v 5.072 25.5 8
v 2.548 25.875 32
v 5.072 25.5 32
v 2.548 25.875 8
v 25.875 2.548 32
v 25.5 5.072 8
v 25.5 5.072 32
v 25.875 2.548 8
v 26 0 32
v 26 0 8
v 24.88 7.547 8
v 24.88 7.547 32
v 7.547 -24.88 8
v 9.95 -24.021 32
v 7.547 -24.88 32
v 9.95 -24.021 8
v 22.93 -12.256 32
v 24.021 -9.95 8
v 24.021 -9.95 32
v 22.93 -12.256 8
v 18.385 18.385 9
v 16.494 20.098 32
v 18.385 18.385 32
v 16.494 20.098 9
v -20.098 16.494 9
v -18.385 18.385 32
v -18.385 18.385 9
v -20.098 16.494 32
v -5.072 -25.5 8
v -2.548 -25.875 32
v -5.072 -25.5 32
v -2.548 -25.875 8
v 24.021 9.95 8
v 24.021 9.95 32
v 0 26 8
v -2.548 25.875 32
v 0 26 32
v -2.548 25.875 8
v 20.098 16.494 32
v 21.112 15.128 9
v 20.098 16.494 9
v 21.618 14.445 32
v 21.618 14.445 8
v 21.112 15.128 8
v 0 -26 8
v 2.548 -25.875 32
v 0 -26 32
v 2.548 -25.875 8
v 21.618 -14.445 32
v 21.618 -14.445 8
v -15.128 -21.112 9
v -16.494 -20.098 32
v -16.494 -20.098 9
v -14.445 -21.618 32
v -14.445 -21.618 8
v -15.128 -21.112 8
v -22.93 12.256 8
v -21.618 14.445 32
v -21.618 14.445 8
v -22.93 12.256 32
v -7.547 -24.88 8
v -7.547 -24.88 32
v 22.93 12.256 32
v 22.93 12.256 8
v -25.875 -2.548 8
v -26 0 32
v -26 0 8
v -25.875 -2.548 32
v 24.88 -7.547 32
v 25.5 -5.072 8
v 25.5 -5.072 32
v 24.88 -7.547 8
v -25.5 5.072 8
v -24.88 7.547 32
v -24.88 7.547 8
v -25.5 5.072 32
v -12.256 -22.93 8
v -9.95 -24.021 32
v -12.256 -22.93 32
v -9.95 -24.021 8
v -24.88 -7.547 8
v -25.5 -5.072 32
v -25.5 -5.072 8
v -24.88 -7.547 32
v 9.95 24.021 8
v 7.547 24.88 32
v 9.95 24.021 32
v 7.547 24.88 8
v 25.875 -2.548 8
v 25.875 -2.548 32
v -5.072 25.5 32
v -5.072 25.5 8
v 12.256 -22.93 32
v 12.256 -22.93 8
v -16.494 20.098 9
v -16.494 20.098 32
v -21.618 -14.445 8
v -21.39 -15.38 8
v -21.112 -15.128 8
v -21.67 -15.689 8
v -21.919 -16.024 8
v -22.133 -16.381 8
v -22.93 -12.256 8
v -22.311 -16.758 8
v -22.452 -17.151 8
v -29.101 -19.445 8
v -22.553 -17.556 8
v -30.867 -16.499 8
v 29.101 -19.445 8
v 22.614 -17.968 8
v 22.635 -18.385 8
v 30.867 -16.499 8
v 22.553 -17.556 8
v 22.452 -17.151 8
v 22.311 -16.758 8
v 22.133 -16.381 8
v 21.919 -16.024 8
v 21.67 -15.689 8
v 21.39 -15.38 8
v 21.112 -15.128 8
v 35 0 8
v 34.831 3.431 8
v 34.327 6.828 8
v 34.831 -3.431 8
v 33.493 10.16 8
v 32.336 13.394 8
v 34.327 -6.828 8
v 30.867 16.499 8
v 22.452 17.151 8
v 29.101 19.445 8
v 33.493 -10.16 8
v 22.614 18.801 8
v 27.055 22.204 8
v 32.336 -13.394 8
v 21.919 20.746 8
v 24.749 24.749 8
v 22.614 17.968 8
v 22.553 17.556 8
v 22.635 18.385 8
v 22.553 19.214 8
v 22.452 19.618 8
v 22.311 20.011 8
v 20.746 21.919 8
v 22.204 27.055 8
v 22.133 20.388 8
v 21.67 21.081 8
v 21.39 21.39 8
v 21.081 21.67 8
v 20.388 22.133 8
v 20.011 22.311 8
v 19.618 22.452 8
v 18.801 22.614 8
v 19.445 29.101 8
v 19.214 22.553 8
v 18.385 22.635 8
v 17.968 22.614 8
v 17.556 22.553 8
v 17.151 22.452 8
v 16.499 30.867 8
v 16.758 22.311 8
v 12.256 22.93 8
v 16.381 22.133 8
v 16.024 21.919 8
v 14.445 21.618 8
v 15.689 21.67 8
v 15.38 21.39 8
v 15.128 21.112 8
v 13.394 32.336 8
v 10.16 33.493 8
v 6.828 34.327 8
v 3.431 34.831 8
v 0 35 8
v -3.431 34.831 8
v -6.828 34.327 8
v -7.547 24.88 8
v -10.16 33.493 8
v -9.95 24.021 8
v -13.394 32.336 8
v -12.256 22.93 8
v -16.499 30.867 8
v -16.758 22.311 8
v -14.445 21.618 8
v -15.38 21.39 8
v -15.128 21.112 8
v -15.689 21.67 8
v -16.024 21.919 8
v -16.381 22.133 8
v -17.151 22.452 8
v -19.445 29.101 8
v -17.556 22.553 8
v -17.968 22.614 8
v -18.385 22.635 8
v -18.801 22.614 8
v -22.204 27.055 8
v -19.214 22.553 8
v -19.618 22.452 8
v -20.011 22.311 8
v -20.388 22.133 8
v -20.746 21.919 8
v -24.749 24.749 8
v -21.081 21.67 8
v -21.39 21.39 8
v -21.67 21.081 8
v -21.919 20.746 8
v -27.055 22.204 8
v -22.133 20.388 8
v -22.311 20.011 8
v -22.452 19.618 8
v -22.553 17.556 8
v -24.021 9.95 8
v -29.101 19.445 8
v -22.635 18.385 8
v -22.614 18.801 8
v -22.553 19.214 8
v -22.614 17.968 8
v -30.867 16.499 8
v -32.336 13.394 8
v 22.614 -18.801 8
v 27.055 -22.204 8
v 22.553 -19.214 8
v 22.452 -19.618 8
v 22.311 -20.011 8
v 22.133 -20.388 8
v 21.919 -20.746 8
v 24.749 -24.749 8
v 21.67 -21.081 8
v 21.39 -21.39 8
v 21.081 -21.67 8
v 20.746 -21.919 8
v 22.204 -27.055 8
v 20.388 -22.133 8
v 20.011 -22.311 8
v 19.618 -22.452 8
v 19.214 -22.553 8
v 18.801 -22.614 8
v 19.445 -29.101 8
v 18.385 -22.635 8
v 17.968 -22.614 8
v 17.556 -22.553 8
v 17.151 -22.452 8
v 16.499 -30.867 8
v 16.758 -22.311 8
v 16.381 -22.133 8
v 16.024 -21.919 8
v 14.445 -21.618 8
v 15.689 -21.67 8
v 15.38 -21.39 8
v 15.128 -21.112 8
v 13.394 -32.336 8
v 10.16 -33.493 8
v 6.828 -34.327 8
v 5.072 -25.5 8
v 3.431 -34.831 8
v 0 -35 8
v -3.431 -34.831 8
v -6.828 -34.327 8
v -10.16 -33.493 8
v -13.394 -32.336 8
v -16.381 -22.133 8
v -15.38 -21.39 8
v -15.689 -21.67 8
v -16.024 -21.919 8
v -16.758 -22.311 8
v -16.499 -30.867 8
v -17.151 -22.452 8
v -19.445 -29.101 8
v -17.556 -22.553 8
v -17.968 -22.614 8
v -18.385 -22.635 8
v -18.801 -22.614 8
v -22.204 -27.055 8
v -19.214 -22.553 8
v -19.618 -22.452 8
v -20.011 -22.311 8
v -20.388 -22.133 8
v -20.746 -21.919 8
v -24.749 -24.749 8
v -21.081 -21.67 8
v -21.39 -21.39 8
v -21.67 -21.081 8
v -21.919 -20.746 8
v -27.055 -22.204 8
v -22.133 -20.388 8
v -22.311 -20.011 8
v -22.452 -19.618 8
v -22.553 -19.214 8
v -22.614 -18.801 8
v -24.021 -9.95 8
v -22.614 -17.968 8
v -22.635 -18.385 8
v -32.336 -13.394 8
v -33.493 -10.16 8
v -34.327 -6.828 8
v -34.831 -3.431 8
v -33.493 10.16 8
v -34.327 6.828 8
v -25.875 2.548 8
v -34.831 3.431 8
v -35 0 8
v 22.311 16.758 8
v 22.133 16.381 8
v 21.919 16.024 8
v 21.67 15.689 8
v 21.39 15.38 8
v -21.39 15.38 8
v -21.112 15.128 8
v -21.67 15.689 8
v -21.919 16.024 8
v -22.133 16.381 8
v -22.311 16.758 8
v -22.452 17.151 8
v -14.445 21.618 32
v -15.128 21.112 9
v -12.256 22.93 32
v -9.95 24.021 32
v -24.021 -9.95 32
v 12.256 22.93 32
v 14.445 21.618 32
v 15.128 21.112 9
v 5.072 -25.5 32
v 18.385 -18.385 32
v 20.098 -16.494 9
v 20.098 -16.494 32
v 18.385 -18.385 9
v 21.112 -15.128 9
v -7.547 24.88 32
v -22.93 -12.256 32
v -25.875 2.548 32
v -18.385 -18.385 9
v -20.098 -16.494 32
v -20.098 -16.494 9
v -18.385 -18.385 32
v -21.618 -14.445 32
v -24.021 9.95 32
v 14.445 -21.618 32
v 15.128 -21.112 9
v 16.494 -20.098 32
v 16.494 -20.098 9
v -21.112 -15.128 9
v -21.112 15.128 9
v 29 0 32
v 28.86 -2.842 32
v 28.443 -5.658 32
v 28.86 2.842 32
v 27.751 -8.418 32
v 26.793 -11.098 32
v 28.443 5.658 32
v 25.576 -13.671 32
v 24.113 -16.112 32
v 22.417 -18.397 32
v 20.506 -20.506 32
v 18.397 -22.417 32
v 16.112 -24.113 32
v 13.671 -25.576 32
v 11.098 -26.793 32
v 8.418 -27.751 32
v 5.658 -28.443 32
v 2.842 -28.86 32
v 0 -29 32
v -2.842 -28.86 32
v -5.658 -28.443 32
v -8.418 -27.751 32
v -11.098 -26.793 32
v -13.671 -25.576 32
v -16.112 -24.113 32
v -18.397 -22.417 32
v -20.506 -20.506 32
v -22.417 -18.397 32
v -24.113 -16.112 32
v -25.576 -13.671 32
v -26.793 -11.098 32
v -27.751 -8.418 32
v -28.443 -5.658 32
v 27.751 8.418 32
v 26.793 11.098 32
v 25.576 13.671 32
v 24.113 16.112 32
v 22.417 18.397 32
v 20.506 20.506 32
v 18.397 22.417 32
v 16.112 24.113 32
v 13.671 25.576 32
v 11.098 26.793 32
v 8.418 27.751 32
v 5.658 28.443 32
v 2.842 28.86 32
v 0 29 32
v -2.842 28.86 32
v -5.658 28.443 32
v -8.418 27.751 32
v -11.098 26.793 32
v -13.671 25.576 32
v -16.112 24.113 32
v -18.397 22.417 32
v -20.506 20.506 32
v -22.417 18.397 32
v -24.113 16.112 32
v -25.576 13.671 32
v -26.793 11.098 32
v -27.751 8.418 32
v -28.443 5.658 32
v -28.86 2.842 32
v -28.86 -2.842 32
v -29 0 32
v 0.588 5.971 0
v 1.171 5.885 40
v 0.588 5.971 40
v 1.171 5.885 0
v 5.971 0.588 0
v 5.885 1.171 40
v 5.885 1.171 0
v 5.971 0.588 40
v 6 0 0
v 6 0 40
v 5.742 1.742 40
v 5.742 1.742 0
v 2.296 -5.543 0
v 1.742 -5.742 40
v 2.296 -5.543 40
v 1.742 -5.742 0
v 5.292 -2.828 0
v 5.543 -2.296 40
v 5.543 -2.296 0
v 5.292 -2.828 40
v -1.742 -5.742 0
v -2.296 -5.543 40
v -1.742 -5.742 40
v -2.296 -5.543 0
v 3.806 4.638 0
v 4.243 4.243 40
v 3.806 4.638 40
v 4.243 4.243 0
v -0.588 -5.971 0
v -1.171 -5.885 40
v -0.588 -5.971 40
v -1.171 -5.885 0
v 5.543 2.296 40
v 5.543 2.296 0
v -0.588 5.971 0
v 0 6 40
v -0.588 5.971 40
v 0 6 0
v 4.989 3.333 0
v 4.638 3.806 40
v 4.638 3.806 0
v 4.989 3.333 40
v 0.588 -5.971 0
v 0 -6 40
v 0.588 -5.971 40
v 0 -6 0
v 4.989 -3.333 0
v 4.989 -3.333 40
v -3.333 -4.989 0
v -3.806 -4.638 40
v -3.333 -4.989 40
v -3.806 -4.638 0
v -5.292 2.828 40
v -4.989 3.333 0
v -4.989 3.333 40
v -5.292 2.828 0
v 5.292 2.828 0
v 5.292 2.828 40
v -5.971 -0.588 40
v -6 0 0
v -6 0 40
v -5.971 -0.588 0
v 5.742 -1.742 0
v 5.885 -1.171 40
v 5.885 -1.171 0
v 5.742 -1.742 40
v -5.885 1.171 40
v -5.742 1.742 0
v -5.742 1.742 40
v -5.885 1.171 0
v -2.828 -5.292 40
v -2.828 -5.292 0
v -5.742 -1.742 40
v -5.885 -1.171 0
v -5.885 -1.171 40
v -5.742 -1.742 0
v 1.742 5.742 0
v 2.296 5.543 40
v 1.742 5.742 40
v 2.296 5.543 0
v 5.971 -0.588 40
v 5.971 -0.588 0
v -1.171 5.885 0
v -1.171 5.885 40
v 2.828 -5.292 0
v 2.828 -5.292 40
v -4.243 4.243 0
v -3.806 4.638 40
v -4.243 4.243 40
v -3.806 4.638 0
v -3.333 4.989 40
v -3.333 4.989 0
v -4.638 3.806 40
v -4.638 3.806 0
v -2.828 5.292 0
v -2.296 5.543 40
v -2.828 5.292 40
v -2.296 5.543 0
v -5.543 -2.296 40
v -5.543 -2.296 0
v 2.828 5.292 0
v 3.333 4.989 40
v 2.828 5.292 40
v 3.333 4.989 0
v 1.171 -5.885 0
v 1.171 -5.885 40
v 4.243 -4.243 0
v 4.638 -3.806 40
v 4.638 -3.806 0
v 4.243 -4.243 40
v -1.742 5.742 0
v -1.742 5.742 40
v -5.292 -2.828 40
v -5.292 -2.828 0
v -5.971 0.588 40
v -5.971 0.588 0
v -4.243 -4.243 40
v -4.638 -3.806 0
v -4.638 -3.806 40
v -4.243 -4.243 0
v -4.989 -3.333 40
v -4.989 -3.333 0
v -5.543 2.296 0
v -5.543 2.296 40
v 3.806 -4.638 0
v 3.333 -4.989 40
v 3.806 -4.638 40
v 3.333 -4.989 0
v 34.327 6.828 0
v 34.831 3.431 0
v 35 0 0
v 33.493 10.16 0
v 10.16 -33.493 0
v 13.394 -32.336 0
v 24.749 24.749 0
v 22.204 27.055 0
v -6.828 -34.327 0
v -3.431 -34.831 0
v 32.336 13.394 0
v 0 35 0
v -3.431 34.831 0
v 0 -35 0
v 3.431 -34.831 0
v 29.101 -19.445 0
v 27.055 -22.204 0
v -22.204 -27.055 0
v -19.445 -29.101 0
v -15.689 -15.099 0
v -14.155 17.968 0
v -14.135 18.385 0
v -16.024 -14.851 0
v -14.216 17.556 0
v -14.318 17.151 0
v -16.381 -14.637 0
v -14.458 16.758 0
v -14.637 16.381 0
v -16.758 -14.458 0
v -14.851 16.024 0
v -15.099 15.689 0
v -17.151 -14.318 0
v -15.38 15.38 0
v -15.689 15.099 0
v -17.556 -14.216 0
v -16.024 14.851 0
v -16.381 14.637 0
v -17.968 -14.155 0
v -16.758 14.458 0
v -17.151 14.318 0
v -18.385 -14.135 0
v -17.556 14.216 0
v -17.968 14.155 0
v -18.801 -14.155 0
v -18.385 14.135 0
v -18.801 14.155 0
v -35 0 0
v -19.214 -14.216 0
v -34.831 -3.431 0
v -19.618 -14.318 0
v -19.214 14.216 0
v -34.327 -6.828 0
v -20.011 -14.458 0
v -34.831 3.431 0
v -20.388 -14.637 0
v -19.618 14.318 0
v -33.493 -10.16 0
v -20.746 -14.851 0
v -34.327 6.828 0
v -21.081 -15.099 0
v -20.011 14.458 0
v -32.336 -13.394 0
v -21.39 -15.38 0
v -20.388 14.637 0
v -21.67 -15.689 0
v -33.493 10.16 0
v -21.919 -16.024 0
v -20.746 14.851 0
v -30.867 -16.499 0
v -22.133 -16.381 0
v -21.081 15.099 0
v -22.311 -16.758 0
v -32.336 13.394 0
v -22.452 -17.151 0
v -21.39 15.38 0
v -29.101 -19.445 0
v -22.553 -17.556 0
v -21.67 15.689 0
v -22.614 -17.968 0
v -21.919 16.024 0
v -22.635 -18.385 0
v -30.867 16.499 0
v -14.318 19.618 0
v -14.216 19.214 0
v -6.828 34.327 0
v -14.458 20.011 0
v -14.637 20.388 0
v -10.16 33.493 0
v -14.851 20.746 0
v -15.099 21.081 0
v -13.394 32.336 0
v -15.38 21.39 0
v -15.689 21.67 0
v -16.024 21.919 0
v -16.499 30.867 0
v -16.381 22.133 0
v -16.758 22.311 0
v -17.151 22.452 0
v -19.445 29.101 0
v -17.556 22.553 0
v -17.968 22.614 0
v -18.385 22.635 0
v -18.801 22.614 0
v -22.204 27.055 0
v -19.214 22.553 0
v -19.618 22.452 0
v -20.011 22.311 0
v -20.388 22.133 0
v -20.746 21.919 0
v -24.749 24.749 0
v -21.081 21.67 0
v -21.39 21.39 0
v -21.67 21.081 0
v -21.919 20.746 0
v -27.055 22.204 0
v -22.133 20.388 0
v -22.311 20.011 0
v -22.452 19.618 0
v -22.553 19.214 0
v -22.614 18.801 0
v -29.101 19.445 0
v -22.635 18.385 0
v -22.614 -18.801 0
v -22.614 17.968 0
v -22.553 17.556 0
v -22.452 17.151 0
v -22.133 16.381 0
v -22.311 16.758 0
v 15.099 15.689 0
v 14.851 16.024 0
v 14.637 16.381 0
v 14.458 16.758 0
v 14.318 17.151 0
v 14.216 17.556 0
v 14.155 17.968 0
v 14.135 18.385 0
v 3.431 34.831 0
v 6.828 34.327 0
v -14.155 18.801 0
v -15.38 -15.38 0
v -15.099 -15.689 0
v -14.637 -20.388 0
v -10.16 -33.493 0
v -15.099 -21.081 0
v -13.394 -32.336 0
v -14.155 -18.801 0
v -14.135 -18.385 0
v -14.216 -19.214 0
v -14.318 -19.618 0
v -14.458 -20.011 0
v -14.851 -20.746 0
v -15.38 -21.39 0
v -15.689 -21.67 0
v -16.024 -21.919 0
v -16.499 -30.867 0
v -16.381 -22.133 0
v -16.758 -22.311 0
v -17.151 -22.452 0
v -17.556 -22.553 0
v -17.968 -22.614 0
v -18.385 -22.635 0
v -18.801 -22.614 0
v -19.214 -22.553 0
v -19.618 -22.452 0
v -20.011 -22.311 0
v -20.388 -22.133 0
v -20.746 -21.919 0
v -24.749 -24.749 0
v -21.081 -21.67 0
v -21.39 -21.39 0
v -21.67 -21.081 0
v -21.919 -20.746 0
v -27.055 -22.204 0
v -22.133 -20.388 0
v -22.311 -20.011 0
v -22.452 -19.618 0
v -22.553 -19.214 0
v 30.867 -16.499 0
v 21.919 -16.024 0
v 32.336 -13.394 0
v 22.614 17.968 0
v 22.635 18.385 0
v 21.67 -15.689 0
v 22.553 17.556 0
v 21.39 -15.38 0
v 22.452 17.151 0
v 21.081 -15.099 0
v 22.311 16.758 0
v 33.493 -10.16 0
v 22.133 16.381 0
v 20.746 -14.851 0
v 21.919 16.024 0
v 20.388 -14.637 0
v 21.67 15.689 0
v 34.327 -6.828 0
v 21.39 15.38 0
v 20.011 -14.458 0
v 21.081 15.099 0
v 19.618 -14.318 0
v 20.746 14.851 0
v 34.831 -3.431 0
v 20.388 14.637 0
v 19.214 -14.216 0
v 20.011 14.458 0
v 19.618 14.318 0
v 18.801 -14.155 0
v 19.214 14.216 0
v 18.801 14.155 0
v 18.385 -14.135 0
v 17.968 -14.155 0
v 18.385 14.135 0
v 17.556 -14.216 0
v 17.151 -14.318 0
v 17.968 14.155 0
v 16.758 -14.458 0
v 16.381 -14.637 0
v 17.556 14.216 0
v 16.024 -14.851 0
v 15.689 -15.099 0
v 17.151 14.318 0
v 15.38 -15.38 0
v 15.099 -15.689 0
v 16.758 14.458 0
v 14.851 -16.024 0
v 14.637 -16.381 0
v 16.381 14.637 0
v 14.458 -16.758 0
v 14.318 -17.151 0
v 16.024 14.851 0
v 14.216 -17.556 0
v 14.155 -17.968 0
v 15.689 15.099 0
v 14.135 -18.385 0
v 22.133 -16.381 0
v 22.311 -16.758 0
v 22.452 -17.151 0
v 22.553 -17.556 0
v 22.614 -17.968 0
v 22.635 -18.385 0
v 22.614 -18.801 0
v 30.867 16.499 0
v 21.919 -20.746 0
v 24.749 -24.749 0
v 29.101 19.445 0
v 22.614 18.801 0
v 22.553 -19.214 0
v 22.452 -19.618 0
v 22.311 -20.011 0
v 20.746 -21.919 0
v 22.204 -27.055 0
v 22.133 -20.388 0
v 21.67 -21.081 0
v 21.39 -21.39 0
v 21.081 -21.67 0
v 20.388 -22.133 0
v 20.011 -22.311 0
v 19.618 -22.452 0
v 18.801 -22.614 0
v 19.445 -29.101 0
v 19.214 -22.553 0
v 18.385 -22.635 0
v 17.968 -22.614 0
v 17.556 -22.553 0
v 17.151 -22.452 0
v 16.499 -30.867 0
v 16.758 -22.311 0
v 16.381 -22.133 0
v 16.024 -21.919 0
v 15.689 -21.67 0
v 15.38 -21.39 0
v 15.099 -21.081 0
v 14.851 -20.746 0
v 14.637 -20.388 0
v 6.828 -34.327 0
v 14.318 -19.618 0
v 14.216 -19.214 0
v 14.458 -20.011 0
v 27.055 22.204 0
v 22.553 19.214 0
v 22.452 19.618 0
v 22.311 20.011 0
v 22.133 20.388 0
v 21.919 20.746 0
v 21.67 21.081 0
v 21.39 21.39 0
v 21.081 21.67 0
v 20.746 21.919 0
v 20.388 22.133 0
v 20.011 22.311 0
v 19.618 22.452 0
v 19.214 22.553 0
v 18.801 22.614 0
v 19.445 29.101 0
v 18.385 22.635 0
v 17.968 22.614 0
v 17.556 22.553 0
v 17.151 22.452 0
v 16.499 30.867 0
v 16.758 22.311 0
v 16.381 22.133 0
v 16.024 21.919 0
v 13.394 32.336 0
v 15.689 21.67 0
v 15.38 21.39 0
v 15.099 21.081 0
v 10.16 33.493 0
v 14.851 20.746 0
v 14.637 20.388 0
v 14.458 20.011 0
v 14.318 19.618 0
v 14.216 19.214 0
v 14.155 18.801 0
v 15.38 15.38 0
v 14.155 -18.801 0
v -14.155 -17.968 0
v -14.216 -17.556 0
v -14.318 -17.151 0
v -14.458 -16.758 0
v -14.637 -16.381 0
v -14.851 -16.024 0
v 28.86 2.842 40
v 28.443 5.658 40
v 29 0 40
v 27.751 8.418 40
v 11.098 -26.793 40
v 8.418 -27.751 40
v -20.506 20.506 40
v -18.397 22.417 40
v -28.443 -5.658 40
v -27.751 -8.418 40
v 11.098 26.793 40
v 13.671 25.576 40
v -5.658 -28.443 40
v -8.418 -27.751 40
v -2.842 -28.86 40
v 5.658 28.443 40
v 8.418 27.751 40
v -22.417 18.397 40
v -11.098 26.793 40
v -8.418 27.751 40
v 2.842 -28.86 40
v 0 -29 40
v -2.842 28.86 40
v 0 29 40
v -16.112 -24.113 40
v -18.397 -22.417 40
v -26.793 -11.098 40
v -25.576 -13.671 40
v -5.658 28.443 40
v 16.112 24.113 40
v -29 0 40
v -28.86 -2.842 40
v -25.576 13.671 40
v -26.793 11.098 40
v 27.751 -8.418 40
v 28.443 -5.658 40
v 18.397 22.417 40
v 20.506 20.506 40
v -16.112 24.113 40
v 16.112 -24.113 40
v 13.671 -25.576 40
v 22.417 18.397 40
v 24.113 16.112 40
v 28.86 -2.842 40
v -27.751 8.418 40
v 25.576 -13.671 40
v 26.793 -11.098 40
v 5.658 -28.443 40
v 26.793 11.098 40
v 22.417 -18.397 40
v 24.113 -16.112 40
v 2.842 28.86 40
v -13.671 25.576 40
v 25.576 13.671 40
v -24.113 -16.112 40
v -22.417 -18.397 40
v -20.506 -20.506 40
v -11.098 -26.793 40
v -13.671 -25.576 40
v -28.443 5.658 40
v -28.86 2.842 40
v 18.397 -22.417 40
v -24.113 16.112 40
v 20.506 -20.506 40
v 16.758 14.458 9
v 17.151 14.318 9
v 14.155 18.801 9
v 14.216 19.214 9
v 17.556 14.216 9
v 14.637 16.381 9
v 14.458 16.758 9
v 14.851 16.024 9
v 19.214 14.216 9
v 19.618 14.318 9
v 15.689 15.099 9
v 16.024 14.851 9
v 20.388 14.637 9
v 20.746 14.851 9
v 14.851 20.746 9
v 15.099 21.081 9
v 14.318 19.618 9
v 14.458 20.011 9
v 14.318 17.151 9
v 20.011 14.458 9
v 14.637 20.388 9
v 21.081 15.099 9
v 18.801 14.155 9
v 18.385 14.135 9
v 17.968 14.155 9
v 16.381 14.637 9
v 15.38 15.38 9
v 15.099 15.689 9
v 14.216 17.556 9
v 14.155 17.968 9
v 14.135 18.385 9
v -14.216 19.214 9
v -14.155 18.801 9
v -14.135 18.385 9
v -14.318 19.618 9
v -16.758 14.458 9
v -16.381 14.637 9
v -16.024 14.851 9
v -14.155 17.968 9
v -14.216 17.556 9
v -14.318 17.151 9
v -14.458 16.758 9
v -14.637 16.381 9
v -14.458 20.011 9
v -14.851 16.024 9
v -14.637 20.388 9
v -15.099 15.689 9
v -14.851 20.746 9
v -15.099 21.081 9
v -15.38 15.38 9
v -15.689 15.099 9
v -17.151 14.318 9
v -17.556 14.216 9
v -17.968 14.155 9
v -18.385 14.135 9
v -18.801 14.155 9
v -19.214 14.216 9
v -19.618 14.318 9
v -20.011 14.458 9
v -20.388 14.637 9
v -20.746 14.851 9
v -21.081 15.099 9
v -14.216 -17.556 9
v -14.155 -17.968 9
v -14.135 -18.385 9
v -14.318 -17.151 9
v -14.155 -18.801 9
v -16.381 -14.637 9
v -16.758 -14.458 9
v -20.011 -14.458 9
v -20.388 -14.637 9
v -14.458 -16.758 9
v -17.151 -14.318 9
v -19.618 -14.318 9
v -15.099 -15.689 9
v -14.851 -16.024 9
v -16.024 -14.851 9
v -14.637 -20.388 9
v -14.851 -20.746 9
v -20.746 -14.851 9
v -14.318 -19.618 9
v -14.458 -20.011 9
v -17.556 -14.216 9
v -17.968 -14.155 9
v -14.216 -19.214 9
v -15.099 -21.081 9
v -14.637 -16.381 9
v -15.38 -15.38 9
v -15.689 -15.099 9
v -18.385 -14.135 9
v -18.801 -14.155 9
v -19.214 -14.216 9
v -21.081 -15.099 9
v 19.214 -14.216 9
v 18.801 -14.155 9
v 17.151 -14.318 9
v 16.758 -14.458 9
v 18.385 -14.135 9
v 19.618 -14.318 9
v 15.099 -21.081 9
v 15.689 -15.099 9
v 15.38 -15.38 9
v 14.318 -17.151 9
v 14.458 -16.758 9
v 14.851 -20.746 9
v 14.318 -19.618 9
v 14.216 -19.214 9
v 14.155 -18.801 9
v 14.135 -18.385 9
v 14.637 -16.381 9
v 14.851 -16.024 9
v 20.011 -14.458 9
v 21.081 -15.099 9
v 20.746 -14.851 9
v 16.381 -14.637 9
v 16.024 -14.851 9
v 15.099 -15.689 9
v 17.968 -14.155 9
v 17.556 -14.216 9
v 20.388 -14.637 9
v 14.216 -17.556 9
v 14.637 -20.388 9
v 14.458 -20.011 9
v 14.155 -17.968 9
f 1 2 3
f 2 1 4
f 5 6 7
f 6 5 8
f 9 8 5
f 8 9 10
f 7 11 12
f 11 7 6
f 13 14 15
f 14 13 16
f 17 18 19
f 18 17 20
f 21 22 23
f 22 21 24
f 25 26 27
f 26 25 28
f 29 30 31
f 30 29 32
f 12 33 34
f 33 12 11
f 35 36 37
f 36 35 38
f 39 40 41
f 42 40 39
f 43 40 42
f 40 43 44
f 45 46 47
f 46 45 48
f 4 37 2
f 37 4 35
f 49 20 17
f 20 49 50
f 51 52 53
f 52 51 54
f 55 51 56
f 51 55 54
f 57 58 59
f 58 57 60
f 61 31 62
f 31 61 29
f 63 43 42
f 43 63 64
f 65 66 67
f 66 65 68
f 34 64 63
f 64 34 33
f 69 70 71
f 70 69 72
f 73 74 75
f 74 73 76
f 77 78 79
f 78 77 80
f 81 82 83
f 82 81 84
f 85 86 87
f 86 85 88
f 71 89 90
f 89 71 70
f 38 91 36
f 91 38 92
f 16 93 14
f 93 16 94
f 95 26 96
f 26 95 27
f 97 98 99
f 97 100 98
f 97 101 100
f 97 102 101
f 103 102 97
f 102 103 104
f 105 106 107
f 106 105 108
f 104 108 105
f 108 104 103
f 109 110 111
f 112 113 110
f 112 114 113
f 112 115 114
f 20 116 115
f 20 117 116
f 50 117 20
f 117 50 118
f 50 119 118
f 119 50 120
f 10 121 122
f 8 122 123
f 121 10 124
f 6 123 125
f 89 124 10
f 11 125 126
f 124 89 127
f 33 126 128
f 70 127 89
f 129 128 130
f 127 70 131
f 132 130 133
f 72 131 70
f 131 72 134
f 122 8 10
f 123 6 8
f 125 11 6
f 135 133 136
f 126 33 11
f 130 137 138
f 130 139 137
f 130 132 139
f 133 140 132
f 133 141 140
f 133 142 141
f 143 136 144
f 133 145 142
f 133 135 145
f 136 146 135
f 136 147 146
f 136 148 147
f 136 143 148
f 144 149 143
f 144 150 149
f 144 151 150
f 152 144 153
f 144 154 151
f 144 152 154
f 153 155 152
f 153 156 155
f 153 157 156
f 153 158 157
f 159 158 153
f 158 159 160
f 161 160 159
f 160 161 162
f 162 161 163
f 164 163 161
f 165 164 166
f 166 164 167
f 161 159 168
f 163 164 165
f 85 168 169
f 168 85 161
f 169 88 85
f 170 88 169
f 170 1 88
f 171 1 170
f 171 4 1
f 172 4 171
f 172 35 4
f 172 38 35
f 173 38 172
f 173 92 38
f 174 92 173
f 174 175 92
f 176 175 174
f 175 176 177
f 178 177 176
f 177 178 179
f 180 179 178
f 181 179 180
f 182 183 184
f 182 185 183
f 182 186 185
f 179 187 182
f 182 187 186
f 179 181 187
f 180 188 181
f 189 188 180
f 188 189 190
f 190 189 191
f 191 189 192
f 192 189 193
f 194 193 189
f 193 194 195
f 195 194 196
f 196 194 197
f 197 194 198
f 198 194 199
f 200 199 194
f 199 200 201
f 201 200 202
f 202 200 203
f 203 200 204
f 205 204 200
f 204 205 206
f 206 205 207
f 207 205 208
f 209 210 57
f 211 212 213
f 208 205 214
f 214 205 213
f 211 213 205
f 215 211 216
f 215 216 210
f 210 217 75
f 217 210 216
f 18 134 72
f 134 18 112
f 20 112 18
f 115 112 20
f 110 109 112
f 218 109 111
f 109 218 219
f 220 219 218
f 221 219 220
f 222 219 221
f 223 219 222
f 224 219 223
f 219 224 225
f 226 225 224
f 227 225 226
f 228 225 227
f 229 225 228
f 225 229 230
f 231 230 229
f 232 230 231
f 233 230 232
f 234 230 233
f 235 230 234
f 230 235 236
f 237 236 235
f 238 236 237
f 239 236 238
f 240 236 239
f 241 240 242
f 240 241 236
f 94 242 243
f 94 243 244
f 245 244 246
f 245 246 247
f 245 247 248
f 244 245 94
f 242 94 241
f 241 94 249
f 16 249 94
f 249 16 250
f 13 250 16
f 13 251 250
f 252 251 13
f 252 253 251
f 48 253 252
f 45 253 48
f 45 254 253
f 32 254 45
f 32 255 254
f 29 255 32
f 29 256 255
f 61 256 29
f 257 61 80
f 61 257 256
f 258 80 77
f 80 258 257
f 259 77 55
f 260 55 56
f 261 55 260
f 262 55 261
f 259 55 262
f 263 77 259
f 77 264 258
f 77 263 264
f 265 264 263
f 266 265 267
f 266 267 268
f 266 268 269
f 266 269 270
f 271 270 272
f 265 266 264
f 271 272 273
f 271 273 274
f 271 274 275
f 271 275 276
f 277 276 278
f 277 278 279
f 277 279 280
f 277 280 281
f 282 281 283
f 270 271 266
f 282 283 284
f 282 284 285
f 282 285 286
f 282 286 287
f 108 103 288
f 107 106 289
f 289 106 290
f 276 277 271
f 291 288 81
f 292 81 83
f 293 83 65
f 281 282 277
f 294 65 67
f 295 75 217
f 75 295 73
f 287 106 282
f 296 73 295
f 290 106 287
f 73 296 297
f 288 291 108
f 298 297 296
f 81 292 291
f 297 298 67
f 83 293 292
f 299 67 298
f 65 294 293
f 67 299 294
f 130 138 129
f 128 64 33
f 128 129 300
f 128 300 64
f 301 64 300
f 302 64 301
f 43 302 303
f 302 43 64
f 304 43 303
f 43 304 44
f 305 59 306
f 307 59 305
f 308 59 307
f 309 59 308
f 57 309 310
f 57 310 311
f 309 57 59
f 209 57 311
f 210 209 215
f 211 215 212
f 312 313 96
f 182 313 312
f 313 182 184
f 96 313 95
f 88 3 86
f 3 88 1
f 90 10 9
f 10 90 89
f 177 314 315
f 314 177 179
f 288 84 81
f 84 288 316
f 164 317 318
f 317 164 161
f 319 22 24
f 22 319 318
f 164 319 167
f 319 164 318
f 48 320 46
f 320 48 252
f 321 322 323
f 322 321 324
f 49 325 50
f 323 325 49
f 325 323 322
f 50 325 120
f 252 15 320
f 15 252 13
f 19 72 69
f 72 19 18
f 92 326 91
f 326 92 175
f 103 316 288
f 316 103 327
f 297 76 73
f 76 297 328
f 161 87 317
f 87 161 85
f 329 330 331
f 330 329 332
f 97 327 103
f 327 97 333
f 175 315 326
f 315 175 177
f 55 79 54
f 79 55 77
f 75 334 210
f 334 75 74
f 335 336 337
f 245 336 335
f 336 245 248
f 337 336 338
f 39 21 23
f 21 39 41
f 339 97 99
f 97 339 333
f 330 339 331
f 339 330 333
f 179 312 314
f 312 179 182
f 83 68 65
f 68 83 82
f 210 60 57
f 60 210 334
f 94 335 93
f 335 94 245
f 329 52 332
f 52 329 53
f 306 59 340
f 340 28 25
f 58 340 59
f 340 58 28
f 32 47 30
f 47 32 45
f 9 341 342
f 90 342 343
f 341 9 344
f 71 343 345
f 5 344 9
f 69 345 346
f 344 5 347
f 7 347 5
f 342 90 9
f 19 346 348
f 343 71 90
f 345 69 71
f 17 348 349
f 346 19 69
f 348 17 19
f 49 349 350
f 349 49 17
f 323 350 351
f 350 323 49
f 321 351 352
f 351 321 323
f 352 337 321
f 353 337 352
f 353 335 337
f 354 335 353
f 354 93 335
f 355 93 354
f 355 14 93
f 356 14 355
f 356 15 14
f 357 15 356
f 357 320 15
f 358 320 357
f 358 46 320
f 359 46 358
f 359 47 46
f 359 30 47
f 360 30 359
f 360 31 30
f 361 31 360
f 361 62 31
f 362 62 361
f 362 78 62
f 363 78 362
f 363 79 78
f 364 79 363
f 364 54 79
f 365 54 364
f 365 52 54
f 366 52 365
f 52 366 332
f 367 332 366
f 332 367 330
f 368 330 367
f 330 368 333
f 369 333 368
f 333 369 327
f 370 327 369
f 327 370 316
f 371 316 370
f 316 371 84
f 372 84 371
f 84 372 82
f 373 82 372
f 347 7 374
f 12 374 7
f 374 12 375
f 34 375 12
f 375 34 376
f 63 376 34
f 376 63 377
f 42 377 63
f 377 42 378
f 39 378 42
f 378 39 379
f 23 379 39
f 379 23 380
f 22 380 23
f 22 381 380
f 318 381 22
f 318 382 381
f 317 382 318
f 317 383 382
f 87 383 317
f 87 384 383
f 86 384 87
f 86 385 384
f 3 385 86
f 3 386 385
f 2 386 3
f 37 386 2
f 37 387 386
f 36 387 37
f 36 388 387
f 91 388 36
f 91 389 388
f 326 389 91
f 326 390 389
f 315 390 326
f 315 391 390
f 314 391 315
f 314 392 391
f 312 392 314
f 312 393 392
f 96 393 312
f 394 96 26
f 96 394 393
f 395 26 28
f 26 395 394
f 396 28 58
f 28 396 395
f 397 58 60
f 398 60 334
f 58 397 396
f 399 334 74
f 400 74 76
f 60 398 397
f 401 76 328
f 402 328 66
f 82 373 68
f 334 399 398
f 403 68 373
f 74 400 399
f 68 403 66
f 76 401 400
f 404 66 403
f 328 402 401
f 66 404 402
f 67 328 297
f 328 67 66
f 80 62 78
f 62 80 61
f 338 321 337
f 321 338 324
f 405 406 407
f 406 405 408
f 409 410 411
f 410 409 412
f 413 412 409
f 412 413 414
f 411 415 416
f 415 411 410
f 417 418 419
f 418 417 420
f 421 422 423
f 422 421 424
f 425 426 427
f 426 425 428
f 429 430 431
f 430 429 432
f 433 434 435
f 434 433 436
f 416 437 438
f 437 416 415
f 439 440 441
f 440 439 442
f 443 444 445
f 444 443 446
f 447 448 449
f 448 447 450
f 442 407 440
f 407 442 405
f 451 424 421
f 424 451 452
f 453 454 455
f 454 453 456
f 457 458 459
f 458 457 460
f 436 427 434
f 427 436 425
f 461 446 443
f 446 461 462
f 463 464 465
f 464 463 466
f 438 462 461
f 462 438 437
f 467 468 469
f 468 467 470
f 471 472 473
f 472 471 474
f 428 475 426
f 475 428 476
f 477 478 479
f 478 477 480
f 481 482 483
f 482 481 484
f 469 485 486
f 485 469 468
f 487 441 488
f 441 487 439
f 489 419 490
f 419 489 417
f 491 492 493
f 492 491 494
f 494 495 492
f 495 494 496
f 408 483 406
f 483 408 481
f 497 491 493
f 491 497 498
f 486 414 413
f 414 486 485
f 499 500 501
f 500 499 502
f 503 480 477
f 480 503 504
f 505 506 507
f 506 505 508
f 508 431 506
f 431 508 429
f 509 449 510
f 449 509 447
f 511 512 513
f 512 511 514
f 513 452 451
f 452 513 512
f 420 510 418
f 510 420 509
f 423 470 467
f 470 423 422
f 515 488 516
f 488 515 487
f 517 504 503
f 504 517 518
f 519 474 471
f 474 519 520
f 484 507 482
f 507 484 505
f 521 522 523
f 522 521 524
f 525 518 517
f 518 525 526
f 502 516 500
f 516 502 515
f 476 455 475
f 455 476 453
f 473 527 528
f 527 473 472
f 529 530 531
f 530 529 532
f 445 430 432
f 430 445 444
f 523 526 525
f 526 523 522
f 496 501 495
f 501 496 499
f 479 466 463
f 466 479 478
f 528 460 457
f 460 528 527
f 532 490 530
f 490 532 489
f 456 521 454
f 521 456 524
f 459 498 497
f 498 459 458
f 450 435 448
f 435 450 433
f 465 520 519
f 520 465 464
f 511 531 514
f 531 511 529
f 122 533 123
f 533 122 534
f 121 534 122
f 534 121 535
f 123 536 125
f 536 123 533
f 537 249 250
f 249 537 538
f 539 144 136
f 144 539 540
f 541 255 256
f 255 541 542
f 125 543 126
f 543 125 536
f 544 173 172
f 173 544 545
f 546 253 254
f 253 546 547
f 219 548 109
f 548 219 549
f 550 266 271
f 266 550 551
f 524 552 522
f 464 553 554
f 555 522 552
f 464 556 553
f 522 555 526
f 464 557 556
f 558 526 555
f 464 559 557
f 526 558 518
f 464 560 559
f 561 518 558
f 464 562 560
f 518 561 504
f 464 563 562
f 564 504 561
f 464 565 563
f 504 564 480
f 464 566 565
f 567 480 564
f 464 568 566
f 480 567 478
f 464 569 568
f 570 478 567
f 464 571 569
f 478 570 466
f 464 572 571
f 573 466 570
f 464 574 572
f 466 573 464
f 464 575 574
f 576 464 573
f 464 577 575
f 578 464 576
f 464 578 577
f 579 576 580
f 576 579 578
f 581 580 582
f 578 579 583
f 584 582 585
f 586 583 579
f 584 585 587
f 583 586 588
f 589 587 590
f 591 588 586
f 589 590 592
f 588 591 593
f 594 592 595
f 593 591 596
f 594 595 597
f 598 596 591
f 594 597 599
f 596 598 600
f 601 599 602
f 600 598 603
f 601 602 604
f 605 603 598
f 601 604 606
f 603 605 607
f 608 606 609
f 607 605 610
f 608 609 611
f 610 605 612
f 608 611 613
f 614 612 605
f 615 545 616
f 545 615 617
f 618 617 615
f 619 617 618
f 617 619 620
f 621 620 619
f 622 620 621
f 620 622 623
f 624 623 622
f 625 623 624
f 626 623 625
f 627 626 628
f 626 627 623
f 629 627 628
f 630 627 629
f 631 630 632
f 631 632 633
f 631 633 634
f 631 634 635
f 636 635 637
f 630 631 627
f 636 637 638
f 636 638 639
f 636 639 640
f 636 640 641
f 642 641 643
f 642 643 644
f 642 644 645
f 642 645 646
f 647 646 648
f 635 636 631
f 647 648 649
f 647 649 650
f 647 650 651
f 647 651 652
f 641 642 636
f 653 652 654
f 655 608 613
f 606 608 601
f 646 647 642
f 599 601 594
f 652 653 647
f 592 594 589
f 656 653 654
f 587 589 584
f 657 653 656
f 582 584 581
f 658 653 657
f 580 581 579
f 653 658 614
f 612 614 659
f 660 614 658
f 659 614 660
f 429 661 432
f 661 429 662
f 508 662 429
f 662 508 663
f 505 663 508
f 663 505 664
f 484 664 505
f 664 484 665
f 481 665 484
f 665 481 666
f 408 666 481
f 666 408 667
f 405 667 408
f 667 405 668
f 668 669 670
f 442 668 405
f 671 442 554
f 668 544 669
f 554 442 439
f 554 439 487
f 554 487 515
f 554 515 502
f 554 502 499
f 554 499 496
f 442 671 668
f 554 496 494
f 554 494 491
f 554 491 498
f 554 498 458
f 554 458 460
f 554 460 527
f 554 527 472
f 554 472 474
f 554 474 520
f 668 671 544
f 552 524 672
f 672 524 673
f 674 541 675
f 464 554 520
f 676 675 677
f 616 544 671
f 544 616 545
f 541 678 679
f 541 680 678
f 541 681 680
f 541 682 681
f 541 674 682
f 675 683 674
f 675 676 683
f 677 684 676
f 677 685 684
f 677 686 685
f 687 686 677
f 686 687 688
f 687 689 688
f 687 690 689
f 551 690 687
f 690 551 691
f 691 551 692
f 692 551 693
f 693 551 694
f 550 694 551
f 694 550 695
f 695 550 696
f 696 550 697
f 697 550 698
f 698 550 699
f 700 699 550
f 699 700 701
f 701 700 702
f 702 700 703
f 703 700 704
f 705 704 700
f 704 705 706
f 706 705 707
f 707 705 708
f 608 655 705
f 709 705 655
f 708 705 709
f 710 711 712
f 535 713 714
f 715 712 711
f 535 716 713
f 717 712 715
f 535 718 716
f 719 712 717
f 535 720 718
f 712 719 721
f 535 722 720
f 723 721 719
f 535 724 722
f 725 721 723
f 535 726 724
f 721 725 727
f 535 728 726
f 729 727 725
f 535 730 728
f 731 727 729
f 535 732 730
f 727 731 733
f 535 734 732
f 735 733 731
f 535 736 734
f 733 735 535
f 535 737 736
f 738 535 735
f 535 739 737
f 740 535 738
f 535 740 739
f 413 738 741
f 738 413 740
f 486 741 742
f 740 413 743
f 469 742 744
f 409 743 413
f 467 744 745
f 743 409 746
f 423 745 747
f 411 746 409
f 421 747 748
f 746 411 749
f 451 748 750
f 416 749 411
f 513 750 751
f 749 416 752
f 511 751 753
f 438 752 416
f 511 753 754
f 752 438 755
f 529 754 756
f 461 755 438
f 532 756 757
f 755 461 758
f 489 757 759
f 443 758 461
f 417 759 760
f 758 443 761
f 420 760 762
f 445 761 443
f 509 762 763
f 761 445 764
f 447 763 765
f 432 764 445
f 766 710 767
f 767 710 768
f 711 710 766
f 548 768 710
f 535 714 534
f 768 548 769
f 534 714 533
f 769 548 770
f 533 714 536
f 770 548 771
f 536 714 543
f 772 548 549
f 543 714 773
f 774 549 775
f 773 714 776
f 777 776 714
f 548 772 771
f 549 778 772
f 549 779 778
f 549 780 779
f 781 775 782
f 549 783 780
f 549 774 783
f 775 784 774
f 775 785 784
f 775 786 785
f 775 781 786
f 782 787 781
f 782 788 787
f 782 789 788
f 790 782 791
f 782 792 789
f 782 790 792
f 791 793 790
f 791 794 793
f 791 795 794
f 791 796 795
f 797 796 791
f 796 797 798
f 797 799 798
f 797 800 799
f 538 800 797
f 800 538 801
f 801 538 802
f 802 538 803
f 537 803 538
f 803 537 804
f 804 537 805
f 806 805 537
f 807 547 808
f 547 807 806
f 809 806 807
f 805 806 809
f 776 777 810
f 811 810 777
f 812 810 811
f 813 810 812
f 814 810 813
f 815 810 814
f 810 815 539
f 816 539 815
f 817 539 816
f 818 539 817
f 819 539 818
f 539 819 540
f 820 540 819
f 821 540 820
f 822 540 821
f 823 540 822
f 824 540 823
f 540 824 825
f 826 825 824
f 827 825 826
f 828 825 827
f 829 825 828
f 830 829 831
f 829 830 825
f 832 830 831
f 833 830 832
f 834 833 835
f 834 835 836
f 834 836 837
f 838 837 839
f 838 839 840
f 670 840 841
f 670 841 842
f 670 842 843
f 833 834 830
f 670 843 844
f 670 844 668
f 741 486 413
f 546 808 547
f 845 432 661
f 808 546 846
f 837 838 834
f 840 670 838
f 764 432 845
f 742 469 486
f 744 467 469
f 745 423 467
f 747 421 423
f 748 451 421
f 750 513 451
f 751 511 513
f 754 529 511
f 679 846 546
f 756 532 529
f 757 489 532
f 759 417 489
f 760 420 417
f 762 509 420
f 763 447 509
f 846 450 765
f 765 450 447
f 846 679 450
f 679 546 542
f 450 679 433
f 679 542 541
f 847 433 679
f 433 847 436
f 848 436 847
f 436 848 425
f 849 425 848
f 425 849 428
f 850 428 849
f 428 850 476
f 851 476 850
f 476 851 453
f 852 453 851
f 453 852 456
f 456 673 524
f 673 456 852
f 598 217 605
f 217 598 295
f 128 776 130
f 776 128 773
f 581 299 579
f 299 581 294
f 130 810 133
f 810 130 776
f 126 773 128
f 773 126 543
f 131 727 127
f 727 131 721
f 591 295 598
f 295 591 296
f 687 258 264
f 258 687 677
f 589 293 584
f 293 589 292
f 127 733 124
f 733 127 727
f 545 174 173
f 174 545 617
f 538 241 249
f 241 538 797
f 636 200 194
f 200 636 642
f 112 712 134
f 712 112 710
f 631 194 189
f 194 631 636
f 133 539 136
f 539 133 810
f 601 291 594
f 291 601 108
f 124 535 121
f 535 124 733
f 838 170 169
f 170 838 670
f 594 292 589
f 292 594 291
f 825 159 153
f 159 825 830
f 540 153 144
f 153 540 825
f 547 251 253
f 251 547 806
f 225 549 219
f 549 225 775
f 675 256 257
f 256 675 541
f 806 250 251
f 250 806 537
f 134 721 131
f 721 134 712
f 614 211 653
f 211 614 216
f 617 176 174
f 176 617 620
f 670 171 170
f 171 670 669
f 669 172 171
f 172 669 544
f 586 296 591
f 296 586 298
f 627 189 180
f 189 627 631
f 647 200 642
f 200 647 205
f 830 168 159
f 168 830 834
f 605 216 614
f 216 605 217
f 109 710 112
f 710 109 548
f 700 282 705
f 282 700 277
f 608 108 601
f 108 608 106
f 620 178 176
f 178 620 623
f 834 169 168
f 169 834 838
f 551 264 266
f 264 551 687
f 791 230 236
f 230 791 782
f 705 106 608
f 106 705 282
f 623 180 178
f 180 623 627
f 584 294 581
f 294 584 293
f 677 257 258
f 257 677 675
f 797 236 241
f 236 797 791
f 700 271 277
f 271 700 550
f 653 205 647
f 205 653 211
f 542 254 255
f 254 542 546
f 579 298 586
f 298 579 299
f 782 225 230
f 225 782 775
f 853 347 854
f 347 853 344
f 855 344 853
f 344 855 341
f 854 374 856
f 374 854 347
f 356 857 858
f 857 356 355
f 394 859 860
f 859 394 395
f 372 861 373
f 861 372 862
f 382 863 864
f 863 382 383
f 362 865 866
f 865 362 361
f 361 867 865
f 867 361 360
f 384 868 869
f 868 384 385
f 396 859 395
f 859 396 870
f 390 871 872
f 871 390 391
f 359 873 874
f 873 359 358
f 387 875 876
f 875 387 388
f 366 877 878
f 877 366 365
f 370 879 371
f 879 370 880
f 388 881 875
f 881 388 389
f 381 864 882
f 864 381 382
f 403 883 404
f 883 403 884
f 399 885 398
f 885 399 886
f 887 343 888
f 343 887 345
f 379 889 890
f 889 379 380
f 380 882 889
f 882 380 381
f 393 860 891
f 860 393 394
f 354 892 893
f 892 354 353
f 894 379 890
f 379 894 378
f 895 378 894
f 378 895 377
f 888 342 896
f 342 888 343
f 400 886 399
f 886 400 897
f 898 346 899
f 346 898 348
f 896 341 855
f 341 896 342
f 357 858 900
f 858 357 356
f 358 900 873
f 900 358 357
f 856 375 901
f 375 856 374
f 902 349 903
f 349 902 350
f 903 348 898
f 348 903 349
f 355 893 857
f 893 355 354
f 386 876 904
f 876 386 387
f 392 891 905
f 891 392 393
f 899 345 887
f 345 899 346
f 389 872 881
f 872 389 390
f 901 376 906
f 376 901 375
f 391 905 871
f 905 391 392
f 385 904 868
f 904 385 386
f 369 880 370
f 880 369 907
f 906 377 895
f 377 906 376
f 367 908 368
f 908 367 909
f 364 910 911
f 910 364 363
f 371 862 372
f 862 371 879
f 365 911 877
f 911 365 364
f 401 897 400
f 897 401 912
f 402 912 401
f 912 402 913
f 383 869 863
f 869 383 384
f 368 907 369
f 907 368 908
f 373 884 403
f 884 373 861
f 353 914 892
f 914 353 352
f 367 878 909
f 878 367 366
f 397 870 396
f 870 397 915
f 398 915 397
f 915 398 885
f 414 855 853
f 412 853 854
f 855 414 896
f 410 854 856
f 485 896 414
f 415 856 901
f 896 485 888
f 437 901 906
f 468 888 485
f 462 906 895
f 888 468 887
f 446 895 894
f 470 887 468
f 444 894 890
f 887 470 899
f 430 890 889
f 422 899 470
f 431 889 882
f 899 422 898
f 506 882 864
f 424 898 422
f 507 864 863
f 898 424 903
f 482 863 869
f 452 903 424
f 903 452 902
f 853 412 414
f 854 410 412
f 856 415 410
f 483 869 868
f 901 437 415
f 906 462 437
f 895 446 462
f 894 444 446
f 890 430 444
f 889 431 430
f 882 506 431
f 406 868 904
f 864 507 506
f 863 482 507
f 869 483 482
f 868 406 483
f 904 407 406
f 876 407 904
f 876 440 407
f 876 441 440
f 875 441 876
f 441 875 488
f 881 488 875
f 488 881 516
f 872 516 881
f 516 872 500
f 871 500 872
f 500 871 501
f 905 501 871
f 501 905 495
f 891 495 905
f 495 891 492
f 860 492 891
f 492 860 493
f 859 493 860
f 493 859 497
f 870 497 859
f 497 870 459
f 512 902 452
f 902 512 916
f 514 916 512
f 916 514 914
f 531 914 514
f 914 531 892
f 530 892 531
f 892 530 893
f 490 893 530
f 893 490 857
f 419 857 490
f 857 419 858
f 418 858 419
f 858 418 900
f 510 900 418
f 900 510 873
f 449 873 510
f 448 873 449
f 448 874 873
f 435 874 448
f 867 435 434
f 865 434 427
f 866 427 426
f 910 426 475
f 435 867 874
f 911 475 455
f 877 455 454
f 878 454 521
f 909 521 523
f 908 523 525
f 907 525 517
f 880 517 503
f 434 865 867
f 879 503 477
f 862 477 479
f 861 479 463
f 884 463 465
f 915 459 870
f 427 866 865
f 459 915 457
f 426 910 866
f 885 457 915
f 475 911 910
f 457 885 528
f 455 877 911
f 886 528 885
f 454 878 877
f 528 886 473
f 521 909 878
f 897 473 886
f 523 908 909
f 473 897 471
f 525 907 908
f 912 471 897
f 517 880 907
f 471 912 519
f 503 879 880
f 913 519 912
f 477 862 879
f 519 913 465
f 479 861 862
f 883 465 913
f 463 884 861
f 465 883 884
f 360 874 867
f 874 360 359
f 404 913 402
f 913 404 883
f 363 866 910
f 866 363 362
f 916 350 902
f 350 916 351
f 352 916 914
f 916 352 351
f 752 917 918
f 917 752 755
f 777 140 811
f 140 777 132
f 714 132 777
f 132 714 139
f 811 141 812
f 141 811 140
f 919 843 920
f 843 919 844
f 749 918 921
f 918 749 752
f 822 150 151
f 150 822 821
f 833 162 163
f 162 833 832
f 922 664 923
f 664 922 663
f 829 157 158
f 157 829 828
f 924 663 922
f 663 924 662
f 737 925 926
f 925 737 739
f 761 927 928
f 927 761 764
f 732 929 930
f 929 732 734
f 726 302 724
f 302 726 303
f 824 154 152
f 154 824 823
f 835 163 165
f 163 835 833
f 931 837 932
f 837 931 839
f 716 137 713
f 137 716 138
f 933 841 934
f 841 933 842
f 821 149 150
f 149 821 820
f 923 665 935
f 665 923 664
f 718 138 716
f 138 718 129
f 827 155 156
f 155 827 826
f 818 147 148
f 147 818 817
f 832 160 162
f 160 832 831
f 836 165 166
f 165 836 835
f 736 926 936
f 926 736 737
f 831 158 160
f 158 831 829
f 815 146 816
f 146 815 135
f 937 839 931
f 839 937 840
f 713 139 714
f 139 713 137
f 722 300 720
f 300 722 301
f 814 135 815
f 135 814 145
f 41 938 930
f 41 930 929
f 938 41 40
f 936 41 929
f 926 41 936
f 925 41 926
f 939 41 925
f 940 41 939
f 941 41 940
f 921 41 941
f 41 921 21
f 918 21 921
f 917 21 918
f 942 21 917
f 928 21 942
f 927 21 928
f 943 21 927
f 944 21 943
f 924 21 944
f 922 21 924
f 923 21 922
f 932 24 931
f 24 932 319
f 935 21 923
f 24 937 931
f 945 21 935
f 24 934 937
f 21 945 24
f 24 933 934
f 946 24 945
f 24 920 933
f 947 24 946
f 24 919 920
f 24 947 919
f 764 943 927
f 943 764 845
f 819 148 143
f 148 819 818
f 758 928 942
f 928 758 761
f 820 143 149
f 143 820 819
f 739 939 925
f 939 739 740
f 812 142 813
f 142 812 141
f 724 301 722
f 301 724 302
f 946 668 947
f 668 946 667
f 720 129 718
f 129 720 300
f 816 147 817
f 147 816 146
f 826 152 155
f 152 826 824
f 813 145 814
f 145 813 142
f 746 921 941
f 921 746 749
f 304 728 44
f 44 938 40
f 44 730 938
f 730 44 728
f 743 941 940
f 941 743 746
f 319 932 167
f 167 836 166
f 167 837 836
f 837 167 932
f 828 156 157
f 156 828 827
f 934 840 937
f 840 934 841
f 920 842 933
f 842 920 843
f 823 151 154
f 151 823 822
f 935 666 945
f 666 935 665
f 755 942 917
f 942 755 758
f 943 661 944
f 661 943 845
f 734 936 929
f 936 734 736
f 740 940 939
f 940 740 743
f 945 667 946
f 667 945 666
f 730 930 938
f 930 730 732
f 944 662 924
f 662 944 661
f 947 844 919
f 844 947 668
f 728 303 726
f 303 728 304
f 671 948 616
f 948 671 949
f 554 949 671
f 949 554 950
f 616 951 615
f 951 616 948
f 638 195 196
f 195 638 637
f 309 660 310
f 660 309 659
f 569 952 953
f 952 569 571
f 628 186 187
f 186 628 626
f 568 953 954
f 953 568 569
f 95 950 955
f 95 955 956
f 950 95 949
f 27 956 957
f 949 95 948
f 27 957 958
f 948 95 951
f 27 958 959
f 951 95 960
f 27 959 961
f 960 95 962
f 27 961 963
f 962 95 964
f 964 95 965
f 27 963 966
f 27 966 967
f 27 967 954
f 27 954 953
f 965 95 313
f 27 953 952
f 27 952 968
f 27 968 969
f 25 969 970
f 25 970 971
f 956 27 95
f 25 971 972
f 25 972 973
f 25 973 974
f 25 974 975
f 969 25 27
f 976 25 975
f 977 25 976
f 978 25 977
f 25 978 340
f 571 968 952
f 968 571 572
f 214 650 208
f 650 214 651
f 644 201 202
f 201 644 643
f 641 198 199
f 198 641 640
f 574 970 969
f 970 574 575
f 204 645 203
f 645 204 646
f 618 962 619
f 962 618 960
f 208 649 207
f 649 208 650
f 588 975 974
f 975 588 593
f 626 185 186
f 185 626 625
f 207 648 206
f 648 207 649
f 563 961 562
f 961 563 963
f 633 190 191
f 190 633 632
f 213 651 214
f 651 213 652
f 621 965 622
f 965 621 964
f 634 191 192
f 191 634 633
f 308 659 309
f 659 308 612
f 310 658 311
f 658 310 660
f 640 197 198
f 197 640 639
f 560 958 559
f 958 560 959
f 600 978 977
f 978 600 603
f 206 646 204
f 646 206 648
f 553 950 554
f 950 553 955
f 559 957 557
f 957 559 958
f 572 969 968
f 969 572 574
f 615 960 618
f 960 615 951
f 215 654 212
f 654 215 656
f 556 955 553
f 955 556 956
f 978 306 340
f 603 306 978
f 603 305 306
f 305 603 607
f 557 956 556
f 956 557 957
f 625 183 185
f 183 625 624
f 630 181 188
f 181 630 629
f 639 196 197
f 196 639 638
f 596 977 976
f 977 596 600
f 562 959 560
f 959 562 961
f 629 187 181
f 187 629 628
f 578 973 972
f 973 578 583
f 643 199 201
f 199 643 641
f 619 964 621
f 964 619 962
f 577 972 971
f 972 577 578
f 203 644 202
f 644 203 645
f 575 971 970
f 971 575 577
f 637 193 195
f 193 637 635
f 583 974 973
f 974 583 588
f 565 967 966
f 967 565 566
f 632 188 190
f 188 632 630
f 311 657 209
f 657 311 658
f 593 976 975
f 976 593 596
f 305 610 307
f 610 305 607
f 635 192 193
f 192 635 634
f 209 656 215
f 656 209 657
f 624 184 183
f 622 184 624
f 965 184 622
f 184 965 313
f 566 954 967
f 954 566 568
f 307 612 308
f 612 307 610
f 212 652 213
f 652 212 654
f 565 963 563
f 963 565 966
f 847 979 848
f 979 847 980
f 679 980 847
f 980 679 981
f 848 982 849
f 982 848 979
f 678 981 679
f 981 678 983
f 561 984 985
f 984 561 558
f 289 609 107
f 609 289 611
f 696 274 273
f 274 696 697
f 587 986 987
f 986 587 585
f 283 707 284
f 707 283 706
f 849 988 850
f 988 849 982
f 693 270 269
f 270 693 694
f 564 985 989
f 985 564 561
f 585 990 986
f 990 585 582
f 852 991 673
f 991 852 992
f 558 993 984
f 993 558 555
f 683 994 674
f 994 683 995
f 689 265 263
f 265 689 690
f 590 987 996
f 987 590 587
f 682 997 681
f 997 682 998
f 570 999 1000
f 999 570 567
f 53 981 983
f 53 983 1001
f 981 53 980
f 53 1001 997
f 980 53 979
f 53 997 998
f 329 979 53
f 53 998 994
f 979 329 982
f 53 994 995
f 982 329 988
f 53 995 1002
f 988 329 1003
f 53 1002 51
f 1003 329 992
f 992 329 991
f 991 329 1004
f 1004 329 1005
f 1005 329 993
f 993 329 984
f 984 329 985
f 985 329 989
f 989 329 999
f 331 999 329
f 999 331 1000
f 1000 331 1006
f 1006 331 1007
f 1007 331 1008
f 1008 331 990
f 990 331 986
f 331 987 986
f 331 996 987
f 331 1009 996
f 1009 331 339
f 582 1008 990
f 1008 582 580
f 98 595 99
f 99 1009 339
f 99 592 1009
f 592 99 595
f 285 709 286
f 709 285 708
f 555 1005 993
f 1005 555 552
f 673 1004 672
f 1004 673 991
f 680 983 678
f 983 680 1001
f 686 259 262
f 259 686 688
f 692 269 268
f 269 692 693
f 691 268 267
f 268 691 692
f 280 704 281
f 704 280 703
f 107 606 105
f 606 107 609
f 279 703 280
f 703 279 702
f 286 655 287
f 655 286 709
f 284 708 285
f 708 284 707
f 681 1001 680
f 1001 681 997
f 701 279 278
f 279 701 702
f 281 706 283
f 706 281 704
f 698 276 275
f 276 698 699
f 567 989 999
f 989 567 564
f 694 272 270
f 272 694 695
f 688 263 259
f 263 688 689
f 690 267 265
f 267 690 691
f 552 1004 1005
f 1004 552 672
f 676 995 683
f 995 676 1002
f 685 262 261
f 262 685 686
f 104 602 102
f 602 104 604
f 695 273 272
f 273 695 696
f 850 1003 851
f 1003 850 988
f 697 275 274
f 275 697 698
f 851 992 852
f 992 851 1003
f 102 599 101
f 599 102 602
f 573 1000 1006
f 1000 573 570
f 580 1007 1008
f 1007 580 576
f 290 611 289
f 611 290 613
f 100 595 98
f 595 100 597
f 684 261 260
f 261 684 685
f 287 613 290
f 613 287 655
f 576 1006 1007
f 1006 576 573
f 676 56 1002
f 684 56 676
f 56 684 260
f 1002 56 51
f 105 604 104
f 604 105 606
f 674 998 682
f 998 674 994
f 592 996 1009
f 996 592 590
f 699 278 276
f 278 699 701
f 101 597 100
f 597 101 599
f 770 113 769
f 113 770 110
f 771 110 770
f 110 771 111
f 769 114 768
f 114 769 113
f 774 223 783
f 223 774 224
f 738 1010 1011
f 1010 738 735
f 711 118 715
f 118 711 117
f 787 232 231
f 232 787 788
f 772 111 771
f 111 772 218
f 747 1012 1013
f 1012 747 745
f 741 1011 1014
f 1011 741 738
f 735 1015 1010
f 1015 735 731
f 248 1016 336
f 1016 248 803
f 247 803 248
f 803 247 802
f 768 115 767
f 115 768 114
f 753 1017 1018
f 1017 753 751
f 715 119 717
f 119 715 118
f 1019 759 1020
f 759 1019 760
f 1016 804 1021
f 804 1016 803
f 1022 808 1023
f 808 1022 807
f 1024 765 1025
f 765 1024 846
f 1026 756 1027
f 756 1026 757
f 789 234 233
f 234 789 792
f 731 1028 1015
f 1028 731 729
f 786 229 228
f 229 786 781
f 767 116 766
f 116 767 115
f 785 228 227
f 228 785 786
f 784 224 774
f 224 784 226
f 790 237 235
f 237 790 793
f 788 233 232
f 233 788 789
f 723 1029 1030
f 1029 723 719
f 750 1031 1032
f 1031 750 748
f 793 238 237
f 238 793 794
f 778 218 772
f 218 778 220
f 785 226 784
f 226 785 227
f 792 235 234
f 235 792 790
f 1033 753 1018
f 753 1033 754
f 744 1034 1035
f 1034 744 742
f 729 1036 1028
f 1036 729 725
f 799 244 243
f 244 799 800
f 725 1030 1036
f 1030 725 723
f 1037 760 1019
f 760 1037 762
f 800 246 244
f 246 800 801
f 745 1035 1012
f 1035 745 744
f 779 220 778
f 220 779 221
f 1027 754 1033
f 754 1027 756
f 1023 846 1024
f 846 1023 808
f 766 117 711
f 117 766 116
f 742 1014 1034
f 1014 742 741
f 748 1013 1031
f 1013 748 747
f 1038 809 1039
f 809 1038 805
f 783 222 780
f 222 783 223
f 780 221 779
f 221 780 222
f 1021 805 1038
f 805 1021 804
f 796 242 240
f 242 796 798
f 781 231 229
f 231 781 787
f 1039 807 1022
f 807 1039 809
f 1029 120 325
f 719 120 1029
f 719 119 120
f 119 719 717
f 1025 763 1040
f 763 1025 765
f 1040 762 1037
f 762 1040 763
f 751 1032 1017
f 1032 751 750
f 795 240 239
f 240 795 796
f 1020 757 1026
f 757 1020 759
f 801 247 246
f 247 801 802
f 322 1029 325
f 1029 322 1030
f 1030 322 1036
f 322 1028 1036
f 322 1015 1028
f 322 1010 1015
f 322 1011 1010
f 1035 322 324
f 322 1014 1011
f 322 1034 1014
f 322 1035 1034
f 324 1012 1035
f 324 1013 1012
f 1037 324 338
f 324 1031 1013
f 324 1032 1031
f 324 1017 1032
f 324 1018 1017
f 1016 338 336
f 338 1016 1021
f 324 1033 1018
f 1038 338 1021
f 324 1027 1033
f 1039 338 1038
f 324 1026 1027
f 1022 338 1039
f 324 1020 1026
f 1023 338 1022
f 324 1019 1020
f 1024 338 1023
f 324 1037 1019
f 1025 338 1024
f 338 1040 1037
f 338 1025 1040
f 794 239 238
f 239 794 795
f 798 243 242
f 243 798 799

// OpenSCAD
// Original MechIntel educational model. CC0-1.0. Units: mm.
// Not a standardized or load-rated component.
$fn=96;
base_diameter=70; base_height=8; elastomer_diameter=52; elastomer_height=24; top_plate_diameter=58; top_plate_height=8; passage=12; bolt_circle=52; bolt_hole=8.5;
$fn=64;
// Exploded-free geometry layout; elastomer is represented as a plain cylinder.
module annulus(d,h){difference(){cylinder(d=d,h=h);translate([0,0,-1]) cylinder(d=passage,h=h+2);}}
difference(){union(){cylinder(d=base_diameter,h=base_height);translate([0,0,base_height]) annulus(elastomer_diameter,elastomer_height);translate([0,0,base_height+elastomer_height]) cylinder(d=top_plate_diameter,h=top_plate_height);}translate([0,0,-1]) cylinder(d=passage,h=base_height+elastomer_height+top_plate_height+2);for(a=[45:90:315]) translate([bolt_circle/2*cos(a),bolt_circle/2*sin(a),-1]) cylinder(d=bolt_hole,h=base_height+2);}
